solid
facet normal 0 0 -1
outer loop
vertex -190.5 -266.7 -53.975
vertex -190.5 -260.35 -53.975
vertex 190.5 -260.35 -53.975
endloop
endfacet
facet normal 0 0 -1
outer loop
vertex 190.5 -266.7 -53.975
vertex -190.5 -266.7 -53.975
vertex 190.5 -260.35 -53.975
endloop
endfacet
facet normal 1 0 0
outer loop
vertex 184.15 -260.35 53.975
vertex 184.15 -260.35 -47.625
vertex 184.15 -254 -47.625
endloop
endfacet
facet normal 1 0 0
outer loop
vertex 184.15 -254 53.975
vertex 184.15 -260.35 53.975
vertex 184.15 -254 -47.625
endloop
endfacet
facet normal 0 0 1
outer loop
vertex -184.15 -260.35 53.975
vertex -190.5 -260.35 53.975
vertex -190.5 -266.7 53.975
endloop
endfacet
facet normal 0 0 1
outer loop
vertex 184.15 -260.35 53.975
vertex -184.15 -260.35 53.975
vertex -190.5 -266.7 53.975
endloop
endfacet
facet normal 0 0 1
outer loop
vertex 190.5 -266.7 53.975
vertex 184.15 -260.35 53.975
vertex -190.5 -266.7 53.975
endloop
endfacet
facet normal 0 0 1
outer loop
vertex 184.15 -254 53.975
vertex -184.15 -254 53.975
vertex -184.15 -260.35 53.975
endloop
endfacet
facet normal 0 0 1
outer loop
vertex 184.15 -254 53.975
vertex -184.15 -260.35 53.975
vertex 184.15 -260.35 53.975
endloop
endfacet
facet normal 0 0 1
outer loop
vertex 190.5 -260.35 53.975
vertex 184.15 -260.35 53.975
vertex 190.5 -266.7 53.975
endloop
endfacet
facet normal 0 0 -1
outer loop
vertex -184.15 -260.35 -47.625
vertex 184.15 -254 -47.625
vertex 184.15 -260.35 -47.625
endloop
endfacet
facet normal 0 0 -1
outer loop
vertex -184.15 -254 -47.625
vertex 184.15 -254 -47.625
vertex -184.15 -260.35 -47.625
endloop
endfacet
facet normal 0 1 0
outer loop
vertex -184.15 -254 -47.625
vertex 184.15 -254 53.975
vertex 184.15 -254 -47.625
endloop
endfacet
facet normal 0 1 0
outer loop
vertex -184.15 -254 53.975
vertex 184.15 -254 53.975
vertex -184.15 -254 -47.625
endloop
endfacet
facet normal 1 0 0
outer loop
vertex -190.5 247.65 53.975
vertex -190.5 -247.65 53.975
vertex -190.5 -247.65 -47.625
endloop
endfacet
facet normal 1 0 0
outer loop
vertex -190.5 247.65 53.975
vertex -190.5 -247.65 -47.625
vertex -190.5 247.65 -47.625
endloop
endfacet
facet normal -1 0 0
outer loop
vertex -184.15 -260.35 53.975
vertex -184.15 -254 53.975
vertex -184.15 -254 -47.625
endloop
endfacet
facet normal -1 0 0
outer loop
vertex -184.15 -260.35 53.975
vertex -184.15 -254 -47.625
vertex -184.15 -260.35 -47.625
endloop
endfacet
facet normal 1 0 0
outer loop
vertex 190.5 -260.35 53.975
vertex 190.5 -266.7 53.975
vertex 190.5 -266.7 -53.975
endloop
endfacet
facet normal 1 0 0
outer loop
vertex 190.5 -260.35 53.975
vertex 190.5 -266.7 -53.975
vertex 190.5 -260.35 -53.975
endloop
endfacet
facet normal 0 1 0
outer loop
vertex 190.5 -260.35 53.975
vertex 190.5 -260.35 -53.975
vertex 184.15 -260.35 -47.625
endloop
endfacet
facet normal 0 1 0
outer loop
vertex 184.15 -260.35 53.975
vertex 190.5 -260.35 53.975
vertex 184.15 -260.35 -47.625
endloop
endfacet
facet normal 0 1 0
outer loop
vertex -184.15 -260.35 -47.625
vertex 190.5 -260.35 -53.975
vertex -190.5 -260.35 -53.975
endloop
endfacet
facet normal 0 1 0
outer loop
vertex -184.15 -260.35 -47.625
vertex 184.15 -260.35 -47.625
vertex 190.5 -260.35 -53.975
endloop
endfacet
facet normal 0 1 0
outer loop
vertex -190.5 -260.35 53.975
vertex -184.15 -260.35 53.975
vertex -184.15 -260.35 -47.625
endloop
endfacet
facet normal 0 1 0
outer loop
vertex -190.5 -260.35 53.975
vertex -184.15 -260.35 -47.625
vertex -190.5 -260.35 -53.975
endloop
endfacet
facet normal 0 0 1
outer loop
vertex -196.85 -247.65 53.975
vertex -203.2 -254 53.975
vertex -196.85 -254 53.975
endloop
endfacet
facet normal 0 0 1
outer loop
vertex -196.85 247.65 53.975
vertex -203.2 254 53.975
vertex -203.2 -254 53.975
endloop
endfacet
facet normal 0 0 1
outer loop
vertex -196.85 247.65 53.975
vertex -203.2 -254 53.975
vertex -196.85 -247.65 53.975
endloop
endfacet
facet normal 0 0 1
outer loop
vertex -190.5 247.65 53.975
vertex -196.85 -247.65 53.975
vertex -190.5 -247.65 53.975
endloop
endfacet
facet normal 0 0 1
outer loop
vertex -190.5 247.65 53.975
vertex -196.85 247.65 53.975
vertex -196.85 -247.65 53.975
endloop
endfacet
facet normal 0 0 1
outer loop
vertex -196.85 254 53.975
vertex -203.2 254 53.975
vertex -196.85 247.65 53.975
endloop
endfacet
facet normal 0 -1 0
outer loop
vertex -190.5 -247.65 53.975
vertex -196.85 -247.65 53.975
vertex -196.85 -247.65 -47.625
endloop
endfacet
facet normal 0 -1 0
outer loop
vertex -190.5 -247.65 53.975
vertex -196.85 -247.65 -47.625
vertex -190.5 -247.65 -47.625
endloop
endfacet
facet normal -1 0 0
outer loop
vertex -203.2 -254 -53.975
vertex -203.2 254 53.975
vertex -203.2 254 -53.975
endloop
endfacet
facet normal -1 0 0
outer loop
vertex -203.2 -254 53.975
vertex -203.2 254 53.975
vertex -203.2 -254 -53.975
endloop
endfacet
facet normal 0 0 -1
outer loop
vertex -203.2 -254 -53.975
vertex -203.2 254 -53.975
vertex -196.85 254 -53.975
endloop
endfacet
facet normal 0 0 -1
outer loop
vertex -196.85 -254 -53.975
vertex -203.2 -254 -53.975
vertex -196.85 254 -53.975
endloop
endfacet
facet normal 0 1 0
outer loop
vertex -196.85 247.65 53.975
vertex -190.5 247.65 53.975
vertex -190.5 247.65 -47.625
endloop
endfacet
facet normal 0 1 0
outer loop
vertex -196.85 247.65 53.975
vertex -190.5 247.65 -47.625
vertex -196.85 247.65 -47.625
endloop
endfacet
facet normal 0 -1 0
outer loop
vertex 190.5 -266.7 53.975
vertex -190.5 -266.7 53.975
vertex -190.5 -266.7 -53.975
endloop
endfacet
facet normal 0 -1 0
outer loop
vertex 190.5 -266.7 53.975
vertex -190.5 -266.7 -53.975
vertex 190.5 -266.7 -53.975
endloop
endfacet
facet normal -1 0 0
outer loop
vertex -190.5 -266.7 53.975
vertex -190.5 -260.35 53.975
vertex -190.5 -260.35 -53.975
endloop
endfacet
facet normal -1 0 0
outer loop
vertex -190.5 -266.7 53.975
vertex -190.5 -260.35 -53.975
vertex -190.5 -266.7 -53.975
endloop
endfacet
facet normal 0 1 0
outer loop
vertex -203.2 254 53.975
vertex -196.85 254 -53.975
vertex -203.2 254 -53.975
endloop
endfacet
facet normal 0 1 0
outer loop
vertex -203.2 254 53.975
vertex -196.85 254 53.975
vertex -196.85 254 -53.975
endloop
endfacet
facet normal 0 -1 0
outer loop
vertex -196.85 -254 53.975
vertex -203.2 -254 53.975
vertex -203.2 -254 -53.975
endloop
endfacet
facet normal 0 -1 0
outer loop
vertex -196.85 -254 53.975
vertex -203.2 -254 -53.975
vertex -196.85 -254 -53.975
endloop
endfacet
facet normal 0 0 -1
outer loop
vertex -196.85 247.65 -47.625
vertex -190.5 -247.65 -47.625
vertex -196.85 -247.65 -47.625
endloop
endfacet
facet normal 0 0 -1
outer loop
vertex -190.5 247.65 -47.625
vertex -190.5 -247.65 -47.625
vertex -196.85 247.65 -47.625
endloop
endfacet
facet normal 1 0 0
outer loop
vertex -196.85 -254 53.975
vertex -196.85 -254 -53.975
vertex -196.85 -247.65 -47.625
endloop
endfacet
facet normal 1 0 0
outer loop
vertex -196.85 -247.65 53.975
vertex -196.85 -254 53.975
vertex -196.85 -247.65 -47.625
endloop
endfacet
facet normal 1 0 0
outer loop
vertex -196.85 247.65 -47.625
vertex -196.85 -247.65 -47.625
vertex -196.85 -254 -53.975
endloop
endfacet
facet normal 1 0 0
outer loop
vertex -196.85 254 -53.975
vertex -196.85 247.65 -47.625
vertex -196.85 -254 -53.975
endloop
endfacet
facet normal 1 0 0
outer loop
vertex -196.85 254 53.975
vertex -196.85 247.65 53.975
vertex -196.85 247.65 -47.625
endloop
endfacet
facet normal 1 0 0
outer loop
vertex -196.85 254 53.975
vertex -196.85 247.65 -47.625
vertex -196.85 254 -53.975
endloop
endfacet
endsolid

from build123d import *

# Parameters (mm, degrees)
F1_DEPTH = 53.975
F3_DEPTH = 53.975
F4_W     = 495.3
F4_H     = 6.35
F5_DEPTH = 6.35
F6_W     = 368.3
F6_H     = 6.35
F7_DEPTH = 6.35


with BuildPart() as f1:
    # F0 (on Top) → F1 (new body, symmetric)
    with BuildSketch(Plane.XY):
        Polygon((-196.85, 254), (-203.2, 254), (-203.2, -254), (-196.85, -254), (-196.85, -247.65), (-190.5, -247.65), (-190.5, 247.65), (-196.85, 247.65), align=None)
    extrude(amount=F1_DEPTH, both=True)

    # F4 (on face) → F5 (cut, through all)
    with BuildSketch(Plane.YZ.offset(-190.5)):
        with Locations((0, -50.8)):
            Rectangle(F4_W, F4_H)
    extrude(amount=-F5_DEPTH, mode=Mode.SUBTRACT)


with BuildPart() as f3:
    # F2 (on Top) → F3 (new body, symmetric)
    with BuildSketch(Plane.XY):
        Polygon((184.15, -254), (-184.15, -254), (-184.15, -260.35), (-190.5, -260.35), (-190.5, -266.7), (190.5, -266.7), (190.5, -260.35), (184.15, -260.35), align=None)
    extrude(amount=F3_DEPTH, both=True)

    # F6 (on face) → F7 (cut, through all)
    with BuildSketch(Plane(origin=(0, -254, 0), x_dir=(-1, 0, 0), z_dir=(0, 1, 0))):
        with Locations((0, -50.8)):
            Rectangle(F6_W, F6_H)
    extrude(amount=-F7_DEPTH, mode=Mode.SUBTRACT)


solid = Compound([f1.part, f3.part])
